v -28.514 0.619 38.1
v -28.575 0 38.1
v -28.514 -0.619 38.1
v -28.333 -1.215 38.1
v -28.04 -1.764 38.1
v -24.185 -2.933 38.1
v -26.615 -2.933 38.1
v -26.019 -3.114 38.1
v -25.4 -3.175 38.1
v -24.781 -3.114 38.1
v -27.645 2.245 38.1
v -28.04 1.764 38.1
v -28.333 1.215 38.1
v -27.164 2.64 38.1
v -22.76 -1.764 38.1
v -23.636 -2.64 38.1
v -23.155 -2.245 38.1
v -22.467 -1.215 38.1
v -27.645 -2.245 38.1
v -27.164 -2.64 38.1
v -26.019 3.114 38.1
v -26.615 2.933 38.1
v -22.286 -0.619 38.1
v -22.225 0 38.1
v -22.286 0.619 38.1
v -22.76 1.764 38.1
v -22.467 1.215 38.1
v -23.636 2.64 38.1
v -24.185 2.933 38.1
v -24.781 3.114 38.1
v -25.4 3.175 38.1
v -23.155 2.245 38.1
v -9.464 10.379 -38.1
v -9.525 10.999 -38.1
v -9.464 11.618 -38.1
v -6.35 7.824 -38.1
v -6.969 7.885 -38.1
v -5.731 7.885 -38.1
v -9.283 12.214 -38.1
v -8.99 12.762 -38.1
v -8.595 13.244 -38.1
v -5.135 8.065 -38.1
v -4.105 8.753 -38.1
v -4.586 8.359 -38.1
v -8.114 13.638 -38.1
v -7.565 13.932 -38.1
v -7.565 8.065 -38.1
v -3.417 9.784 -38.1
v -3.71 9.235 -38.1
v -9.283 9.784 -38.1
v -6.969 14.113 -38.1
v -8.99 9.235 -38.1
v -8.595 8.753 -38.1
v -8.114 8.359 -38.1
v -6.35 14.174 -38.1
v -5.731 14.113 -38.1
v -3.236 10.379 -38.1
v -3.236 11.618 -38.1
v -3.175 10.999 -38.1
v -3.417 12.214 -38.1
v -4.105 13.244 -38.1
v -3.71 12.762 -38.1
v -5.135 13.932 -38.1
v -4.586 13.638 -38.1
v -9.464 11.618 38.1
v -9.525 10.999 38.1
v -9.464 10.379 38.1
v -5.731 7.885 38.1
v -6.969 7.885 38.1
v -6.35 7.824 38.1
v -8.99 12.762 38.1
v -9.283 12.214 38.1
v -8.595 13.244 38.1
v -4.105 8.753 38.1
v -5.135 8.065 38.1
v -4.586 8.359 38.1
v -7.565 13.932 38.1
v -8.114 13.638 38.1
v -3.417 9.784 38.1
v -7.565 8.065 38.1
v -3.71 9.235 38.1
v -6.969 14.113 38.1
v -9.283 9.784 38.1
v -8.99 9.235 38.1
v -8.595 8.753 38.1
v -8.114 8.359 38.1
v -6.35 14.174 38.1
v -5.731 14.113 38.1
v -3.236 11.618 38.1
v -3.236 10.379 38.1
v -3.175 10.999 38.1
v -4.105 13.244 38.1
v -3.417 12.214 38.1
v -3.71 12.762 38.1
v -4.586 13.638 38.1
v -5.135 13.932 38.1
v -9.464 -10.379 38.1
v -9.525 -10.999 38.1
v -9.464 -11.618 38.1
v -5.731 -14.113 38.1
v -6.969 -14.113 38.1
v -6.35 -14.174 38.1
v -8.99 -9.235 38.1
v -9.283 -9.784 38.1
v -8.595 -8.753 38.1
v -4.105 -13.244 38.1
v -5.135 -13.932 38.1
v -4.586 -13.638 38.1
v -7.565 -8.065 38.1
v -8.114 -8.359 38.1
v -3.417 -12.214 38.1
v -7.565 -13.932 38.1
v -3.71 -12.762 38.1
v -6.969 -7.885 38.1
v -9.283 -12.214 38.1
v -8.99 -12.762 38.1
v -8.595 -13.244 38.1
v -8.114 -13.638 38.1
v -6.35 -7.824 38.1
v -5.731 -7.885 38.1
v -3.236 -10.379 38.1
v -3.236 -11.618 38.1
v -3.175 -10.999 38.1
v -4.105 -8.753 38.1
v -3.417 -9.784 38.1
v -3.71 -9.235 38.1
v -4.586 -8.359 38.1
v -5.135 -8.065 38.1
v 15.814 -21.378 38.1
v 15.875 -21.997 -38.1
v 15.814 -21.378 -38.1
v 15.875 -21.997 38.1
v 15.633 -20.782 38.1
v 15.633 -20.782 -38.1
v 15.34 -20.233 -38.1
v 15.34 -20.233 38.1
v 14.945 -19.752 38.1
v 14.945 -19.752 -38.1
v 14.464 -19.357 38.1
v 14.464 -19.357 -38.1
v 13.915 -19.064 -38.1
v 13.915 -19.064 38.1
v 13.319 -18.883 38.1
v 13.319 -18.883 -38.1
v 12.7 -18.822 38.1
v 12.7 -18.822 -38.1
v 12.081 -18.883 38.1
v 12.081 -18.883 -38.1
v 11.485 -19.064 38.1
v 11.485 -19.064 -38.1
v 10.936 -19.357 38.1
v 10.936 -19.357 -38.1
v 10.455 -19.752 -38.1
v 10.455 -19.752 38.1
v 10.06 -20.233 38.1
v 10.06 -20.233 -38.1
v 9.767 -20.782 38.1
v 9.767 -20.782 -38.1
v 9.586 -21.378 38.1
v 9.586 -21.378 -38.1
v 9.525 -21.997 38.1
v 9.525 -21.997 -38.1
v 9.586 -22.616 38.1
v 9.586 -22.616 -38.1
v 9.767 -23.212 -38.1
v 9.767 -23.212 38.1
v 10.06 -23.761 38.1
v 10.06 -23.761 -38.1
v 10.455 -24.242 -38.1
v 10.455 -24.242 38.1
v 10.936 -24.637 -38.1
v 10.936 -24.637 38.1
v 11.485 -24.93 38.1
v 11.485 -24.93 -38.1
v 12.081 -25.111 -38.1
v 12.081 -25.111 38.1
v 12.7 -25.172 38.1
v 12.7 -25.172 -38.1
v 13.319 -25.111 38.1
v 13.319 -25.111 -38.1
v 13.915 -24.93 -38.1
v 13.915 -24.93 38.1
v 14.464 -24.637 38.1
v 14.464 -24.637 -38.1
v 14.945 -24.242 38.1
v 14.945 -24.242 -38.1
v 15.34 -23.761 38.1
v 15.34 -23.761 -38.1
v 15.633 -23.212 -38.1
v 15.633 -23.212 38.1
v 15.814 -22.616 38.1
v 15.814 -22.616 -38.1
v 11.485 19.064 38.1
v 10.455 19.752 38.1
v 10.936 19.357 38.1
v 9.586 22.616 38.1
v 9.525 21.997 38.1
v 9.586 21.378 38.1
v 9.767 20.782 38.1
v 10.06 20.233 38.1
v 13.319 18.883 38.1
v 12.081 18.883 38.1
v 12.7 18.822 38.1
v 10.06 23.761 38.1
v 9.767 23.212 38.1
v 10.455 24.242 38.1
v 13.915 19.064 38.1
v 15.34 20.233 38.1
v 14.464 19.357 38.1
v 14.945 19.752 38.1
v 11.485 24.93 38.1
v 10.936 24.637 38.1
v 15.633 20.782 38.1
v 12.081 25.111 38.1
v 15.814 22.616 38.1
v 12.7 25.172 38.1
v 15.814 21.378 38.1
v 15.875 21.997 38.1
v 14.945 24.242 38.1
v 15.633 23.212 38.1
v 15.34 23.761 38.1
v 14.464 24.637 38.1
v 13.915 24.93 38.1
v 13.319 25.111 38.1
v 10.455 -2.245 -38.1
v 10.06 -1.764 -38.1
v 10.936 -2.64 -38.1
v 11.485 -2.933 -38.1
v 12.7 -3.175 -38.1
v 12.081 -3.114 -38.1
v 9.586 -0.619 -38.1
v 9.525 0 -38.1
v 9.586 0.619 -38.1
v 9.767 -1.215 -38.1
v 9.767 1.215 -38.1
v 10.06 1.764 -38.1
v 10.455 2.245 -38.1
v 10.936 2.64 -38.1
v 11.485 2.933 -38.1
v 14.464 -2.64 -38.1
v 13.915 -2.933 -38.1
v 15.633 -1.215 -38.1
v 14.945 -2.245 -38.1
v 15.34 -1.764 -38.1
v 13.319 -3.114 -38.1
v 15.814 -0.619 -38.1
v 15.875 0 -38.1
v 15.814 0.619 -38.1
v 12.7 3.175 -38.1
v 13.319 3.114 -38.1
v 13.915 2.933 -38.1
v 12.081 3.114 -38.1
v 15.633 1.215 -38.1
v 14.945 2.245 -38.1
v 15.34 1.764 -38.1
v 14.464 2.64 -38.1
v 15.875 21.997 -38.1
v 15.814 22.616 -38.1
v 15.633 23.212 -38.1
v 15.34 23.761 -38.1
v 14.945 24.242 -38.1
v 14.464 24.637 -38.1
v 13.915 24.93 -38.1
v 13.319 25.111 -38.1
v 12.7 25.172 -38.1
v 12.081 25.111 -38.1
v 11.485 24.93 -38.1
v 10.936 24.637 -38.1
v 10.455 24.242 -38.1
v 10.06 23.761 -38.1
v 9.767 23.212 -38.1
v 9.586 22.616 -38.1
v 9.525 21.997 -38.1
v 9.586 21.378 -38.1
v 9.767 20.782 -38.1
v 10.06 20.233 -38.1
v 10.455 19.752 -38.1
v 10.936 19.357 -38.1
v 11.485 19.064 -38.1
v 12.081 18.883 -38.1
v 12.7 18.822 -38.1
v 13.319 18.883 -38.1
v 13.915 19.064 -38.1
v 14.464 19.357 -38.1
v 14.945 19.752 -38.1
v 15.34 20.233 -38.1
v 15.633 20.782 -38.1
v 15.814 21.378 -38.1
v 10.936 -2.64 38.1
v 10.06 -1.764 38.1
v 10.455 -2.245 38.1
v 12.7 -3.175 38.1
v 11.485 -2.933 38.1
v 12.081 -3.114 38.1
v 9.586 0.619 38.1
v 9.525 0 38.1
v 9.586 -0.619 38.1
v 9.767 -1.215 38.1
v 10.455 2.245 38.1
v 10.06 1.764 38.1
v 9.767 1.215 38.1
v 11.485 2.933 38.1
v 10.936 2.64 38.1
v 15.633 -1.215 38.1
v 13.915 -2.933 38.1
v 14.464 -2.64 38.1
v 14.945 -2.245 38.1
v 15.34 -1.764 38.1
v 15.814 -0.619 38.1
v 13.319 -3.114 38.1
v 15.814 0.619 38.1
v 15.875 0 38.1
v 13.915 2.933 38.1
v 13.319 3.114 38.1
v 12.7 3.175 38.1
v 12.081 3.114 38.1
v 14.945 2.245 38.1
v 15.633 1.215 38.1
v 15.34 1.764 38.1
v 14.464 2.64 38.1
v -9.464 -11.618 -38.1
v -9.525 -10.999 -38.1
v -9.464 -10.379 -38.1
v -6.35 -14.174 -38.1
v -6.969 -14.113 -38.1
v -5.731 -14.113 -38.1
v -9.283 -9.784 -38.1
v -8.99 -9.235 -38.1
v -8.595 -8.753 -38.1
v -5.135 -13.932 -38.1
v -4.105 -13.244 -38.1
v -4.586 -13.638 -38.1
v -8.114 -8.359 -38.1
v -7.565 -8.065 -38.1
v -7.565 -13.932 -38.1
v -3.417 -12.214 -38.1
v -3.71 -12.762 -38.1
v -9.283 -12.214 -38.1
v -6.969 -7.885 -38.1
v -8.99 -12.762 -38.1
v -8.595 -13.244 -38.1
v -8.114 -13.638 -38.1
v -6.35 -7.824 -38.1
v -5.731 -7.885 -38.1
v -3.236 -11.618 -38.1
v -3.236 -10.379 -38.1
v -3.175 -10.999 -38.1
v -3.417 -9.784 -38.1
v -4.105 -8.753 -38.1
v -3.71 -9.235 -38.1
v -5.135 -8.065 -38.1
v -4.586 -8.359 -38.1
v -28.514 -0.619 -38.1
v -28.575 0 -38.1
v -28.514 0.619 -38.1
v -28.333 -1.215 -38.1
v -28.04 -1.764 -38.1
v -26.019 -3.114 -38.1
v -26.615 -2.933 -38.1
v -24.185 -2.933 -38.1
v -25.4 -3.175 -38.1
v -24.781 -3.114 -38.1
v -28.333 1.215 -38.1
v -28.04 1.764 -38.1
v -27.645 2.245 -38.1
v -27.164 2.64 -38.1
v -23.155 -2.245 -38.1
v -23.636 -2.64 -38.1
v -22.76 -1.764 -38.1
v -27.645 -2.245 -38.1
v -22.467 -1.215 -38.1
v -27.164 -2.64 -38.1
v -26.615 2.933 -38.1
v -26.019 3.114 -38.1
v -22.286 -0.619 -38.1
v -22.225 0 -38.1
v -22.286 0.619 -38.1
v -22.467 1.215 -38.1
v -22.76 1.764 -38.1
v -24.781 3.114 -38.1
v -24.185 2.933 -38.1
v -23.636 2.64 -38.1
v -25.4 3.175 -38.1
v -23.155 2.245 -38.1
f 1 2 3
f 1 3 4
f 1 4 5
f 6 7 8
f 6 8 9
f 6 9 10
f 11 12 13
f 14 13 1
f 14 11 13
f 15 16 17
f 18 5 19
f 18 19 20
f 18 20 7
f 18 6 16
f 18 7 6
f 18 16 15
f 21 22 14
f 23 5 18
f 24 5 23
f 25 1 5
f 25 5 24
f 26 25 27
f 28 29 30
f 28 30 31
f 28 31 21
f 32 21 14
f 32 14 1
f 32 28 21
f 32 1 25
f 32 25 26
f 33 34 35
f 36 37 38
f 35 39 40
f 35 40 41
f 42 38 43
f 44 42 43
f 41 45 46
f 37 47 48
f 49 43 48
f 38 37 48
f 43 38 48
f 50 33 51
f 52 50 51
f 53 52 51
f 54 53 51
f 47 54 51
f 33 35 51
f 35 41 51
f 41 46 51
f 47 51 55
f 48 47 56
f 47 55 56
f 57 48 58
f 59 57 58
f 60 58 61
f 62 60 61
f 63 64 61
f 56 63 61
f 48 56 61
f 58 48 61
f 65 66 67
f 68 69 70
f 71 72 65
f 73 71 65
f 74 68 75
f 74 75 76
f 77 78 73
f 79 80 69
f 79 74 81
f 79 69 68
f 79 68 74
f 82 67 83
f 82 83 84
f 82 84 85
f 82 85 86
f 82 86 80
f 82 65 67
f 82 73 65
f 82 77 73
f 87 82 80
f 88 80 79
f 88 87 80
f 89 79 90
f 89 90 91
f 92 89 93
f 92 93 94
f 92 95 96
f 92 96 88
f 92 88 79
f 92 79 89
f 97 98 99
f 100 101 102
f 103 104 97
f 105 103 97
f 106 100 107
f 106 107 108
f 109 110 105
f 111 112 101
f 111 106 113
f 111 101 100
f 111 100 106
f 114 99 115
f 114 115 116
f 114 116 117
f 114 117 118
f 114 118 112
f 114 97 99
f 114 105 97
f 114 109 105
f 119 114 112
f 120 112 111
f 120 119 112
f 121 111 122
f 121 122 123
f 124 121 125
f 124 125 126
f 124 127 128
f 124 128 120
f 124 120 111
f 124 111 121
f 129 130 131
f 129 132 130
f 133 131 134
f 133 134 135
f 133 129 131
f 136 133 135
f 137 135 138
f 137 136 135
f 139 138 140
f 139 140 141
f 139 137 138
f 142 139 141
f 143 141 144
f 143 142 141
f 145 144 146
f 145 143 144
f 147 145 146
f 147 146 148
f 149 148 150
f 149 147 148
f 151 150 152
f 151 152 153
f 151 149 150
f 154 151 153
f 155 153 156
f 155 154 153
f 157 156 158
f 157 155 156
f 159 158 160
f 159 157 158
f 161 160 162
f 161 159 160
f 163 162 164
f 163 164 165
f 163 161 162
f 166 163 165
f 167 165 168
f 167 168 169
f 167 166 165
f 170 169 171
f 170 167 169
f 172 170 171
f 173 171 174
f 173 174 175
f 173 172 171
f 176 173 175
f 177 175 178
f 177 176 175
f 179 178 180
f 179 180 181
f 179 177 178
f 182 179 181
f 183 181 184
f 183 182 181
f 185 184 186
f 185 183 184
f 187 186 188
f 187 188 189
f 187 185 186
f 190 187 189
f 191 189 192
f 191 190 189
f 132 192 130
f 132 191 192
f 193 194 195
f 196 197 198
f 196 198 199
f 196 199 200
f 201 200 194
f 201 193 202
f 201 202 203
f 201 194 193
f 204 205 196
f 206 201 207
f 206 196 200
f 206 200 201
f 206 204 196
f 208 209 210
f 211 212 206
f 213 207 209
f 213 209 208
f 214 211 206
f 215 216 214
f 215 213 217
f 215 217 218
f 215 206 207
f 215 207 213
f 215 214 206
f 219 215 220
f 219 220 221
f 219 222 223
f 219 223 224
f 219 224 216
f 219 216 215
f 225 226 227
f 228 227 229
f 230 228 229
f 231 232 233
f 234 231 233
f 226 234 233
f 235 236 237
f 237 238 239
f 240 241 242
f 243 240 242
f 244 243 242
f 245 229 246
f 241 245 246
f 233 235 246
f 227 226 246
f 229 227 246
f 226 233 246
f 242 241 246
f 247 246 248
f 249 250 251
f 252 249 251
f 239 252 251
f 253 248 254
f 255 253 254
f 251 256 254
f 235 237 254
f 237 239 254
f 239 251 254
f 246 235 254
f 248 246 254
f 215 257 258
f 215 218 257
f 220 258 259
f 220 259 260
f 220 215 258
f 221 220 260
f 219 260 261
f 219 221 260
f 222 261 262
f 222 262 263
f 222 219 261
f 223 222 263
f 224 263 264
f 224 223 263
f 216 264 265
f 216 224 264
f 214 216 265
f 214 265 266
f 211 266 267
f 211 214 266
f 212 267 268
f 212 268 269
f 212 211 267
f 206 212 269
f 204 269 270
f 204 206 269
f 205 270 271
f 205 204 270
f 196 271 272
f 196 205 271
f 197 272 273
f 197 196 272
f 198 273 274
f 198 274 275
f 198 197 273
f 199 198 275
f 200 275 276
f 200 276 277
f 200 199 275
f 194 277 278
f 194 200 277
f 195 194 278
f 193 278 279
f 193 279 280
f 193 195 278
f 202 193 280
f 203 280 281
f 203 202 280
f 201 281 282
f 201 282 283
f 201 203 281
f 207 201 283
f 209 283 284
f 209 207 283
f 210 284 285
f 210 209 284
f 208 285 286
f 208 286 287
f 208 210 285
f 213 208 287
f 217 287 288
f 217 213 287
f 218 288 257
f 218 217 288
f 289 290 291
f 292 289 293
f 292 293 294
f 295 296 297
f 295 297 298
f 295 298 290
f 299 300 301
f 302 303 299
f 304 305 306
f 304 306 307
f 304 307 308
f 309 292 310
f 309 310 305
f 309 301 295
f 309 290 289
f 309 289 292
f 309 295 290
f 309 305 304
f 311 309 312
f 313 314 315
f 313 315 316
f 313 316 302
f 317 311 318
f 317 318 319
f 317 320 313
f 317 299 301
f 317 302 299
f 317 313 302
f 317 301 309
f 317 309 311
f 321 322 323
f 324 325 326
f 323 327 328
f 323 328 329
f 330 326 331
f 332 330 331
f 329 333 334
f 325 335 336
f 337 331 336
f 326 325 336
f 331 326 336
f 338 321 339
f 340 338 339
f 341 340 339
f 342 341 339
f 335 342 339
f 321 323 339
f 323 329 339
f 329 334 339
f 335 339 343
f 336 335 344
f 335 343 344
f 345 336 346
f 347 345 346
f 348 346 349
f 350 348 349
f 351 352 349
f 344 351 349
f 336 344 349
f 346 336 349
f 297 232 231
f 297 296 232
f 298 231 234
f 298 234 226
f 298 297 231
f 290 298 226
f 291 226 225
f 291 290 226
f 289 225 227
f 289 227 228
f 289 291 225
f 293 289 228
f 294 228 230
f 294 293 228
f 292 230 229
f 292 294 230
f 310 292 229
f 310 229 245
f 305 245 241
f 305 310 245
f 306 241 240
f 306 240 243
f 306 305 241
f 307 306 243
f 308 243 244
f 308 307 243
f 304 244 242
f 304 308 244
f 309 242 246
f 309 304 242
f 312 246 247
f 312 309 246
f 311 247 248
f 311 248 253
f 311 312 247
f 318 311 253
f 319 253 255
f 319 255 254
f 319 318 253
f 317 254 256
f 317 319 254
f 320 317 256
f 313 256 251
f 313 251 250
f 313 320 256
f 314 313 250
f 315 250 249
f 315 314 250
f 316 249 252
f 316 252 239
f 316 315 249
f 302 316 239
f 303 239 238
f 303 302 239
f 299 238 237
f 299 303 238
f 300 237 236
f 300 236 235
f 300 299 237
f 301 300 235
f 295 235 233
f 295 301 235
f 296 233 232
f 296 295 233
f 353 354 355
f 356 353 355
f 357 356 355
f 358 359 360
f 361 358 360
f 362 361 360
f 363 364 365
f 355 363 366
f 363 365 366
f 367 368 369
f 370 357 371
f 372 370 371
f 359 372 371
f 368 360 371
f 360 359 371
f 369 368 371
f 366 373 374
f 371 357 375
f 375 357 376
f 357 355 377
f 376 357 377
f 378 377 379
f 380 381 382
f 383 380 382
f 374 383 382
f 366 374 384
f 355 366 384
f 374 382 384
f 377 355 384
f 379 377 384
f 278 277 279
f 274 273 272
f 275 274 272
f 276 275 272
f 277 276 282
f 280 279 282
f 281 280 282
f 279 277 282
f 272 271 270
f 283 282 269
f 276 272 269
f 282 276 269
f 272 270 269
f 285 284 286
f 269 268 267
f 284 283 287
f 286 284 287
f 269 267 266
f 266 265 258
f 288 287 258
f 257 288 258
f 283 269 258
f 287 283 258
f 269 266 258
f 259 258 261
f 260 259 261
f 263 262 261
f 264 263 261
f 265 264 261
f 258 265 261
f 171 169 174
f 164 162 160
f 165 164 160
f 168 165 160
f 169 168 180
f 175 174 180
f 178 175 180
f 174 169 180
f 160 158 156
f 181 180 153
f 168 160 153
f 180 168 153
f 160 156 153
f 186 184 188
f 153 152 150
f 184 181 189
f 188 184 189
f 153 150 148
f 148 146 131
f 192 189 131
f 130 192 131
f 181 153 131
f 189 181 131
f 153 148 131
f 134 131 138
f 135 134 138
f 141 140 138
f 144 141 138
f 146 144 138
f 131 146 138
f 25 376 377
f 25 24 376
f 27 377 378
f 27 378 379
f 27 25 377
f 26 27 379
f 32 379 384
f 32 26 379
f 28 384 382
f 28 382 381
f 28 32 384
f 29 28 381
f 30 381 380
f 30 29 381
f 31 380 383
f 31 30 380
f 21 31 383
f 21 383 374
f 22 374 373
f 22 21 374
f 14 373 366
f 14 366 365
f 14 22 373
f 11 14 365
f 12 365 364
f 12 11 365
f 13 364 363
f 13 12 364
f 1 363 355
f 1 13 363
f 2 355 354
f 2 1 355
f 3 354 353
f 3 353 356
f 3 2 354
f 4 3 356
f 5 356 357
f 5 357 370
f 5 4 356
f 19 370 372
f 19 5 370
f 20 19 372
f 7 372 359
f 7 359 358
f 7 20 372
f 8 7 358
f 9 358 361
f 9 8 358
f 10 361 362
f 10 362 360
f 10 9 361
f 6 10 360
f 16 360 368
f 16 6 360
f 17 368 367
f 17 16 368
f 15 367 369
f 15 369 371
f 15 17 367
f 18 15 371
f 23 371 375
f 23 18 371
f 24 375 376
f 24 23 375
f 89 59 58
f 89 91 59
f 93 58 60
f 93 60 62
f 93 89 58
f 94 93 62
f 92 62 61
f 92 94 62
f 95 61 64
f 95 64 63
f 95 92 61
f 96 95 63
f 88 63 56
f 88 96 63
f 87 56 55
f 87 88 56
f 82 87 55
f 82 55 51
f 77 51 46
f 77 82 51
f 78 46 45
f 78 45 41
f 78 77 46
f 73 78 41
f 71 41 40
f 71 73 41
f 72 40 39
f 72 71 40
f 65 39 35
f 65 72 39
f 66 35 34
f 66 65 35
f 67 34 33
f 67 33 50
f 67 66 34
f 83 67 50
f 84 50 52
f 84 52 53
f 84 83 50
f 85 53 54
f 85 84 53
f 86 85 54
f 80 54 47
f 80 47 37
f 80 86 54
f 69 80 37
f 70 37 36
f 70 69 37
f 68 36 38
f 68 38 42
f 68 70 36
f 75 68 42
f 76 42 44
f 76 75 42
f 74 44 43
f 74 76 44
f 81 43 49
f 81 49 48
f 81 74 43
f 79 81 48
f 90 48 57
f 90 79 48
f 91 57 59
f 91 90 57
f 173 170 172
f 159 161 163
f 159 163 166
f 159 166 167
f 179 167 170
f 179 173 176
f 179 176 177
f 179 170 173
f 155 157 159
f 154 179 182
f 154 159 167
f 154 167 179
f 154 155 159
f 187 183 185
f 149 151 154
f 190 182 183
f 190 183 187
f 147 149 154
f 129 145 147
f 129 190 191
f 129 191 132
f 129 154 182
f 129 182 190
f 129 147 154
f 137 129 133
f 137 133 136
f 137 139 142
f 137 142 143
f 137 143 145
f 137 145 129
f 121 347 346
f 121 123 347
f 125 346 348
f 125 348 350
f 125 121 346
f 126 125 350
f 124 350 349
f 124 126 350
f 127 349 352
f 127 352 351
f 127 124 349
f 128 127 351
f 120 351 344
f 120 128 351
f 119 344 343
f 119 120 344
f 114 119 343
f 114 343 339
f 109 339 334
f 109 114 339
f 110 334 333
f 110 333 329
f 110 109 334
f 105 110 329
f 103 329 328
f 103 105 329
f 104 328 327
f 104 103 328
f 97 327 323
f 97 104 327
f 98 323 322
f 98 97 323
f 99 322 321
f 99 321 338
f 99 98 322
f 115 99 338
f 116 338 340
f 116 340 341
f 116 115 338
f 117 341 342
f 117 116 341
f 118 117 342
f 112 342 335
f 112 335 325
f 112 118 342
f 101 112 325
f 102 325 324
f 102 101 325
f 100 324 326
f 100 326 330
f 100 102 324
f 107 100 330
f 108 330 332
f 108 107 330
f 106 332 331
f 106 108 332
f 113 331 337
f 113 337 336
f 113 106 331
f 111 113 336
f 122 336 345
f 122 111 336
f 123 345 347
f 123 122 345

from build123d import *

# Parameters (mm, degrees)
F11_R     = 3.175
F12_DEPTH = 38.1


with BuildPart() as f12:
    # F11 (on Top) → F12 (new body, symmetric)
    with BuildSketch(Plane.XY):
        with Locations((12.7, -21.9970452561)):
            Circle(F11_R)
    extrude(amount=F12_DEPTH, both=True)


with BuildPart() as f12b:
    # F11 (on Top) → F12, piece 2 (new body, symmetric)
    with BuildSketch(Plane.XY):
        with Locations((-6.35, 10.9985226281)):
            Circle(F11_R)
    extrude(amount=F12_DEPTH, both=True)


with BuildPart() as f12c:
    # F11 (on Top) → F12, piece 3 (new body, symmetric)
    with BuildSketch(Plane.XY):
        with Locations((-25.4, 0)):
            Circle(F11_R)
    extrude(amount=F12_DEPTH, both=True)


with BuildPart() as f12d:
    # F11 (on Top) → F12, piece 4 (new body, symmetric)
    with BuildSketch(Plane.XY):
        with BuildLine():
            ThreePointArc((15.875, 0), (12.7, 3.175), (9.525, 0))
            ThreePointArc((9.525, 0), (12.7, -3.175), (15.875, 0))
        make_face()
    extrude(amount=F12_DEPTH, both=True)


with BuildPart() as f12e:
    # F11 (on Top) → F12, piece 5 (new body, symmetric)
    with BuildSketch(Plane.XY):
        with Locations((-6.35, -10.9985226281)):
            Circle(F11_R)
    extrude(amount=F12_DEPTH, both=True)


with BuildPart() as f12f:
    # F11 (on Top) → F12, piece 6 (new body, symmetric)
    with BuildSketch(Plane.XY):
        with Locations((12.7, 21.9970452561)):
            Circle(F11_R)
    extrude(amount=F12_DEPTH, both=True)


solid = Compound([f12.part, f12b.part, f12c.part, f12d.part, f12e.part, f12f.part])
